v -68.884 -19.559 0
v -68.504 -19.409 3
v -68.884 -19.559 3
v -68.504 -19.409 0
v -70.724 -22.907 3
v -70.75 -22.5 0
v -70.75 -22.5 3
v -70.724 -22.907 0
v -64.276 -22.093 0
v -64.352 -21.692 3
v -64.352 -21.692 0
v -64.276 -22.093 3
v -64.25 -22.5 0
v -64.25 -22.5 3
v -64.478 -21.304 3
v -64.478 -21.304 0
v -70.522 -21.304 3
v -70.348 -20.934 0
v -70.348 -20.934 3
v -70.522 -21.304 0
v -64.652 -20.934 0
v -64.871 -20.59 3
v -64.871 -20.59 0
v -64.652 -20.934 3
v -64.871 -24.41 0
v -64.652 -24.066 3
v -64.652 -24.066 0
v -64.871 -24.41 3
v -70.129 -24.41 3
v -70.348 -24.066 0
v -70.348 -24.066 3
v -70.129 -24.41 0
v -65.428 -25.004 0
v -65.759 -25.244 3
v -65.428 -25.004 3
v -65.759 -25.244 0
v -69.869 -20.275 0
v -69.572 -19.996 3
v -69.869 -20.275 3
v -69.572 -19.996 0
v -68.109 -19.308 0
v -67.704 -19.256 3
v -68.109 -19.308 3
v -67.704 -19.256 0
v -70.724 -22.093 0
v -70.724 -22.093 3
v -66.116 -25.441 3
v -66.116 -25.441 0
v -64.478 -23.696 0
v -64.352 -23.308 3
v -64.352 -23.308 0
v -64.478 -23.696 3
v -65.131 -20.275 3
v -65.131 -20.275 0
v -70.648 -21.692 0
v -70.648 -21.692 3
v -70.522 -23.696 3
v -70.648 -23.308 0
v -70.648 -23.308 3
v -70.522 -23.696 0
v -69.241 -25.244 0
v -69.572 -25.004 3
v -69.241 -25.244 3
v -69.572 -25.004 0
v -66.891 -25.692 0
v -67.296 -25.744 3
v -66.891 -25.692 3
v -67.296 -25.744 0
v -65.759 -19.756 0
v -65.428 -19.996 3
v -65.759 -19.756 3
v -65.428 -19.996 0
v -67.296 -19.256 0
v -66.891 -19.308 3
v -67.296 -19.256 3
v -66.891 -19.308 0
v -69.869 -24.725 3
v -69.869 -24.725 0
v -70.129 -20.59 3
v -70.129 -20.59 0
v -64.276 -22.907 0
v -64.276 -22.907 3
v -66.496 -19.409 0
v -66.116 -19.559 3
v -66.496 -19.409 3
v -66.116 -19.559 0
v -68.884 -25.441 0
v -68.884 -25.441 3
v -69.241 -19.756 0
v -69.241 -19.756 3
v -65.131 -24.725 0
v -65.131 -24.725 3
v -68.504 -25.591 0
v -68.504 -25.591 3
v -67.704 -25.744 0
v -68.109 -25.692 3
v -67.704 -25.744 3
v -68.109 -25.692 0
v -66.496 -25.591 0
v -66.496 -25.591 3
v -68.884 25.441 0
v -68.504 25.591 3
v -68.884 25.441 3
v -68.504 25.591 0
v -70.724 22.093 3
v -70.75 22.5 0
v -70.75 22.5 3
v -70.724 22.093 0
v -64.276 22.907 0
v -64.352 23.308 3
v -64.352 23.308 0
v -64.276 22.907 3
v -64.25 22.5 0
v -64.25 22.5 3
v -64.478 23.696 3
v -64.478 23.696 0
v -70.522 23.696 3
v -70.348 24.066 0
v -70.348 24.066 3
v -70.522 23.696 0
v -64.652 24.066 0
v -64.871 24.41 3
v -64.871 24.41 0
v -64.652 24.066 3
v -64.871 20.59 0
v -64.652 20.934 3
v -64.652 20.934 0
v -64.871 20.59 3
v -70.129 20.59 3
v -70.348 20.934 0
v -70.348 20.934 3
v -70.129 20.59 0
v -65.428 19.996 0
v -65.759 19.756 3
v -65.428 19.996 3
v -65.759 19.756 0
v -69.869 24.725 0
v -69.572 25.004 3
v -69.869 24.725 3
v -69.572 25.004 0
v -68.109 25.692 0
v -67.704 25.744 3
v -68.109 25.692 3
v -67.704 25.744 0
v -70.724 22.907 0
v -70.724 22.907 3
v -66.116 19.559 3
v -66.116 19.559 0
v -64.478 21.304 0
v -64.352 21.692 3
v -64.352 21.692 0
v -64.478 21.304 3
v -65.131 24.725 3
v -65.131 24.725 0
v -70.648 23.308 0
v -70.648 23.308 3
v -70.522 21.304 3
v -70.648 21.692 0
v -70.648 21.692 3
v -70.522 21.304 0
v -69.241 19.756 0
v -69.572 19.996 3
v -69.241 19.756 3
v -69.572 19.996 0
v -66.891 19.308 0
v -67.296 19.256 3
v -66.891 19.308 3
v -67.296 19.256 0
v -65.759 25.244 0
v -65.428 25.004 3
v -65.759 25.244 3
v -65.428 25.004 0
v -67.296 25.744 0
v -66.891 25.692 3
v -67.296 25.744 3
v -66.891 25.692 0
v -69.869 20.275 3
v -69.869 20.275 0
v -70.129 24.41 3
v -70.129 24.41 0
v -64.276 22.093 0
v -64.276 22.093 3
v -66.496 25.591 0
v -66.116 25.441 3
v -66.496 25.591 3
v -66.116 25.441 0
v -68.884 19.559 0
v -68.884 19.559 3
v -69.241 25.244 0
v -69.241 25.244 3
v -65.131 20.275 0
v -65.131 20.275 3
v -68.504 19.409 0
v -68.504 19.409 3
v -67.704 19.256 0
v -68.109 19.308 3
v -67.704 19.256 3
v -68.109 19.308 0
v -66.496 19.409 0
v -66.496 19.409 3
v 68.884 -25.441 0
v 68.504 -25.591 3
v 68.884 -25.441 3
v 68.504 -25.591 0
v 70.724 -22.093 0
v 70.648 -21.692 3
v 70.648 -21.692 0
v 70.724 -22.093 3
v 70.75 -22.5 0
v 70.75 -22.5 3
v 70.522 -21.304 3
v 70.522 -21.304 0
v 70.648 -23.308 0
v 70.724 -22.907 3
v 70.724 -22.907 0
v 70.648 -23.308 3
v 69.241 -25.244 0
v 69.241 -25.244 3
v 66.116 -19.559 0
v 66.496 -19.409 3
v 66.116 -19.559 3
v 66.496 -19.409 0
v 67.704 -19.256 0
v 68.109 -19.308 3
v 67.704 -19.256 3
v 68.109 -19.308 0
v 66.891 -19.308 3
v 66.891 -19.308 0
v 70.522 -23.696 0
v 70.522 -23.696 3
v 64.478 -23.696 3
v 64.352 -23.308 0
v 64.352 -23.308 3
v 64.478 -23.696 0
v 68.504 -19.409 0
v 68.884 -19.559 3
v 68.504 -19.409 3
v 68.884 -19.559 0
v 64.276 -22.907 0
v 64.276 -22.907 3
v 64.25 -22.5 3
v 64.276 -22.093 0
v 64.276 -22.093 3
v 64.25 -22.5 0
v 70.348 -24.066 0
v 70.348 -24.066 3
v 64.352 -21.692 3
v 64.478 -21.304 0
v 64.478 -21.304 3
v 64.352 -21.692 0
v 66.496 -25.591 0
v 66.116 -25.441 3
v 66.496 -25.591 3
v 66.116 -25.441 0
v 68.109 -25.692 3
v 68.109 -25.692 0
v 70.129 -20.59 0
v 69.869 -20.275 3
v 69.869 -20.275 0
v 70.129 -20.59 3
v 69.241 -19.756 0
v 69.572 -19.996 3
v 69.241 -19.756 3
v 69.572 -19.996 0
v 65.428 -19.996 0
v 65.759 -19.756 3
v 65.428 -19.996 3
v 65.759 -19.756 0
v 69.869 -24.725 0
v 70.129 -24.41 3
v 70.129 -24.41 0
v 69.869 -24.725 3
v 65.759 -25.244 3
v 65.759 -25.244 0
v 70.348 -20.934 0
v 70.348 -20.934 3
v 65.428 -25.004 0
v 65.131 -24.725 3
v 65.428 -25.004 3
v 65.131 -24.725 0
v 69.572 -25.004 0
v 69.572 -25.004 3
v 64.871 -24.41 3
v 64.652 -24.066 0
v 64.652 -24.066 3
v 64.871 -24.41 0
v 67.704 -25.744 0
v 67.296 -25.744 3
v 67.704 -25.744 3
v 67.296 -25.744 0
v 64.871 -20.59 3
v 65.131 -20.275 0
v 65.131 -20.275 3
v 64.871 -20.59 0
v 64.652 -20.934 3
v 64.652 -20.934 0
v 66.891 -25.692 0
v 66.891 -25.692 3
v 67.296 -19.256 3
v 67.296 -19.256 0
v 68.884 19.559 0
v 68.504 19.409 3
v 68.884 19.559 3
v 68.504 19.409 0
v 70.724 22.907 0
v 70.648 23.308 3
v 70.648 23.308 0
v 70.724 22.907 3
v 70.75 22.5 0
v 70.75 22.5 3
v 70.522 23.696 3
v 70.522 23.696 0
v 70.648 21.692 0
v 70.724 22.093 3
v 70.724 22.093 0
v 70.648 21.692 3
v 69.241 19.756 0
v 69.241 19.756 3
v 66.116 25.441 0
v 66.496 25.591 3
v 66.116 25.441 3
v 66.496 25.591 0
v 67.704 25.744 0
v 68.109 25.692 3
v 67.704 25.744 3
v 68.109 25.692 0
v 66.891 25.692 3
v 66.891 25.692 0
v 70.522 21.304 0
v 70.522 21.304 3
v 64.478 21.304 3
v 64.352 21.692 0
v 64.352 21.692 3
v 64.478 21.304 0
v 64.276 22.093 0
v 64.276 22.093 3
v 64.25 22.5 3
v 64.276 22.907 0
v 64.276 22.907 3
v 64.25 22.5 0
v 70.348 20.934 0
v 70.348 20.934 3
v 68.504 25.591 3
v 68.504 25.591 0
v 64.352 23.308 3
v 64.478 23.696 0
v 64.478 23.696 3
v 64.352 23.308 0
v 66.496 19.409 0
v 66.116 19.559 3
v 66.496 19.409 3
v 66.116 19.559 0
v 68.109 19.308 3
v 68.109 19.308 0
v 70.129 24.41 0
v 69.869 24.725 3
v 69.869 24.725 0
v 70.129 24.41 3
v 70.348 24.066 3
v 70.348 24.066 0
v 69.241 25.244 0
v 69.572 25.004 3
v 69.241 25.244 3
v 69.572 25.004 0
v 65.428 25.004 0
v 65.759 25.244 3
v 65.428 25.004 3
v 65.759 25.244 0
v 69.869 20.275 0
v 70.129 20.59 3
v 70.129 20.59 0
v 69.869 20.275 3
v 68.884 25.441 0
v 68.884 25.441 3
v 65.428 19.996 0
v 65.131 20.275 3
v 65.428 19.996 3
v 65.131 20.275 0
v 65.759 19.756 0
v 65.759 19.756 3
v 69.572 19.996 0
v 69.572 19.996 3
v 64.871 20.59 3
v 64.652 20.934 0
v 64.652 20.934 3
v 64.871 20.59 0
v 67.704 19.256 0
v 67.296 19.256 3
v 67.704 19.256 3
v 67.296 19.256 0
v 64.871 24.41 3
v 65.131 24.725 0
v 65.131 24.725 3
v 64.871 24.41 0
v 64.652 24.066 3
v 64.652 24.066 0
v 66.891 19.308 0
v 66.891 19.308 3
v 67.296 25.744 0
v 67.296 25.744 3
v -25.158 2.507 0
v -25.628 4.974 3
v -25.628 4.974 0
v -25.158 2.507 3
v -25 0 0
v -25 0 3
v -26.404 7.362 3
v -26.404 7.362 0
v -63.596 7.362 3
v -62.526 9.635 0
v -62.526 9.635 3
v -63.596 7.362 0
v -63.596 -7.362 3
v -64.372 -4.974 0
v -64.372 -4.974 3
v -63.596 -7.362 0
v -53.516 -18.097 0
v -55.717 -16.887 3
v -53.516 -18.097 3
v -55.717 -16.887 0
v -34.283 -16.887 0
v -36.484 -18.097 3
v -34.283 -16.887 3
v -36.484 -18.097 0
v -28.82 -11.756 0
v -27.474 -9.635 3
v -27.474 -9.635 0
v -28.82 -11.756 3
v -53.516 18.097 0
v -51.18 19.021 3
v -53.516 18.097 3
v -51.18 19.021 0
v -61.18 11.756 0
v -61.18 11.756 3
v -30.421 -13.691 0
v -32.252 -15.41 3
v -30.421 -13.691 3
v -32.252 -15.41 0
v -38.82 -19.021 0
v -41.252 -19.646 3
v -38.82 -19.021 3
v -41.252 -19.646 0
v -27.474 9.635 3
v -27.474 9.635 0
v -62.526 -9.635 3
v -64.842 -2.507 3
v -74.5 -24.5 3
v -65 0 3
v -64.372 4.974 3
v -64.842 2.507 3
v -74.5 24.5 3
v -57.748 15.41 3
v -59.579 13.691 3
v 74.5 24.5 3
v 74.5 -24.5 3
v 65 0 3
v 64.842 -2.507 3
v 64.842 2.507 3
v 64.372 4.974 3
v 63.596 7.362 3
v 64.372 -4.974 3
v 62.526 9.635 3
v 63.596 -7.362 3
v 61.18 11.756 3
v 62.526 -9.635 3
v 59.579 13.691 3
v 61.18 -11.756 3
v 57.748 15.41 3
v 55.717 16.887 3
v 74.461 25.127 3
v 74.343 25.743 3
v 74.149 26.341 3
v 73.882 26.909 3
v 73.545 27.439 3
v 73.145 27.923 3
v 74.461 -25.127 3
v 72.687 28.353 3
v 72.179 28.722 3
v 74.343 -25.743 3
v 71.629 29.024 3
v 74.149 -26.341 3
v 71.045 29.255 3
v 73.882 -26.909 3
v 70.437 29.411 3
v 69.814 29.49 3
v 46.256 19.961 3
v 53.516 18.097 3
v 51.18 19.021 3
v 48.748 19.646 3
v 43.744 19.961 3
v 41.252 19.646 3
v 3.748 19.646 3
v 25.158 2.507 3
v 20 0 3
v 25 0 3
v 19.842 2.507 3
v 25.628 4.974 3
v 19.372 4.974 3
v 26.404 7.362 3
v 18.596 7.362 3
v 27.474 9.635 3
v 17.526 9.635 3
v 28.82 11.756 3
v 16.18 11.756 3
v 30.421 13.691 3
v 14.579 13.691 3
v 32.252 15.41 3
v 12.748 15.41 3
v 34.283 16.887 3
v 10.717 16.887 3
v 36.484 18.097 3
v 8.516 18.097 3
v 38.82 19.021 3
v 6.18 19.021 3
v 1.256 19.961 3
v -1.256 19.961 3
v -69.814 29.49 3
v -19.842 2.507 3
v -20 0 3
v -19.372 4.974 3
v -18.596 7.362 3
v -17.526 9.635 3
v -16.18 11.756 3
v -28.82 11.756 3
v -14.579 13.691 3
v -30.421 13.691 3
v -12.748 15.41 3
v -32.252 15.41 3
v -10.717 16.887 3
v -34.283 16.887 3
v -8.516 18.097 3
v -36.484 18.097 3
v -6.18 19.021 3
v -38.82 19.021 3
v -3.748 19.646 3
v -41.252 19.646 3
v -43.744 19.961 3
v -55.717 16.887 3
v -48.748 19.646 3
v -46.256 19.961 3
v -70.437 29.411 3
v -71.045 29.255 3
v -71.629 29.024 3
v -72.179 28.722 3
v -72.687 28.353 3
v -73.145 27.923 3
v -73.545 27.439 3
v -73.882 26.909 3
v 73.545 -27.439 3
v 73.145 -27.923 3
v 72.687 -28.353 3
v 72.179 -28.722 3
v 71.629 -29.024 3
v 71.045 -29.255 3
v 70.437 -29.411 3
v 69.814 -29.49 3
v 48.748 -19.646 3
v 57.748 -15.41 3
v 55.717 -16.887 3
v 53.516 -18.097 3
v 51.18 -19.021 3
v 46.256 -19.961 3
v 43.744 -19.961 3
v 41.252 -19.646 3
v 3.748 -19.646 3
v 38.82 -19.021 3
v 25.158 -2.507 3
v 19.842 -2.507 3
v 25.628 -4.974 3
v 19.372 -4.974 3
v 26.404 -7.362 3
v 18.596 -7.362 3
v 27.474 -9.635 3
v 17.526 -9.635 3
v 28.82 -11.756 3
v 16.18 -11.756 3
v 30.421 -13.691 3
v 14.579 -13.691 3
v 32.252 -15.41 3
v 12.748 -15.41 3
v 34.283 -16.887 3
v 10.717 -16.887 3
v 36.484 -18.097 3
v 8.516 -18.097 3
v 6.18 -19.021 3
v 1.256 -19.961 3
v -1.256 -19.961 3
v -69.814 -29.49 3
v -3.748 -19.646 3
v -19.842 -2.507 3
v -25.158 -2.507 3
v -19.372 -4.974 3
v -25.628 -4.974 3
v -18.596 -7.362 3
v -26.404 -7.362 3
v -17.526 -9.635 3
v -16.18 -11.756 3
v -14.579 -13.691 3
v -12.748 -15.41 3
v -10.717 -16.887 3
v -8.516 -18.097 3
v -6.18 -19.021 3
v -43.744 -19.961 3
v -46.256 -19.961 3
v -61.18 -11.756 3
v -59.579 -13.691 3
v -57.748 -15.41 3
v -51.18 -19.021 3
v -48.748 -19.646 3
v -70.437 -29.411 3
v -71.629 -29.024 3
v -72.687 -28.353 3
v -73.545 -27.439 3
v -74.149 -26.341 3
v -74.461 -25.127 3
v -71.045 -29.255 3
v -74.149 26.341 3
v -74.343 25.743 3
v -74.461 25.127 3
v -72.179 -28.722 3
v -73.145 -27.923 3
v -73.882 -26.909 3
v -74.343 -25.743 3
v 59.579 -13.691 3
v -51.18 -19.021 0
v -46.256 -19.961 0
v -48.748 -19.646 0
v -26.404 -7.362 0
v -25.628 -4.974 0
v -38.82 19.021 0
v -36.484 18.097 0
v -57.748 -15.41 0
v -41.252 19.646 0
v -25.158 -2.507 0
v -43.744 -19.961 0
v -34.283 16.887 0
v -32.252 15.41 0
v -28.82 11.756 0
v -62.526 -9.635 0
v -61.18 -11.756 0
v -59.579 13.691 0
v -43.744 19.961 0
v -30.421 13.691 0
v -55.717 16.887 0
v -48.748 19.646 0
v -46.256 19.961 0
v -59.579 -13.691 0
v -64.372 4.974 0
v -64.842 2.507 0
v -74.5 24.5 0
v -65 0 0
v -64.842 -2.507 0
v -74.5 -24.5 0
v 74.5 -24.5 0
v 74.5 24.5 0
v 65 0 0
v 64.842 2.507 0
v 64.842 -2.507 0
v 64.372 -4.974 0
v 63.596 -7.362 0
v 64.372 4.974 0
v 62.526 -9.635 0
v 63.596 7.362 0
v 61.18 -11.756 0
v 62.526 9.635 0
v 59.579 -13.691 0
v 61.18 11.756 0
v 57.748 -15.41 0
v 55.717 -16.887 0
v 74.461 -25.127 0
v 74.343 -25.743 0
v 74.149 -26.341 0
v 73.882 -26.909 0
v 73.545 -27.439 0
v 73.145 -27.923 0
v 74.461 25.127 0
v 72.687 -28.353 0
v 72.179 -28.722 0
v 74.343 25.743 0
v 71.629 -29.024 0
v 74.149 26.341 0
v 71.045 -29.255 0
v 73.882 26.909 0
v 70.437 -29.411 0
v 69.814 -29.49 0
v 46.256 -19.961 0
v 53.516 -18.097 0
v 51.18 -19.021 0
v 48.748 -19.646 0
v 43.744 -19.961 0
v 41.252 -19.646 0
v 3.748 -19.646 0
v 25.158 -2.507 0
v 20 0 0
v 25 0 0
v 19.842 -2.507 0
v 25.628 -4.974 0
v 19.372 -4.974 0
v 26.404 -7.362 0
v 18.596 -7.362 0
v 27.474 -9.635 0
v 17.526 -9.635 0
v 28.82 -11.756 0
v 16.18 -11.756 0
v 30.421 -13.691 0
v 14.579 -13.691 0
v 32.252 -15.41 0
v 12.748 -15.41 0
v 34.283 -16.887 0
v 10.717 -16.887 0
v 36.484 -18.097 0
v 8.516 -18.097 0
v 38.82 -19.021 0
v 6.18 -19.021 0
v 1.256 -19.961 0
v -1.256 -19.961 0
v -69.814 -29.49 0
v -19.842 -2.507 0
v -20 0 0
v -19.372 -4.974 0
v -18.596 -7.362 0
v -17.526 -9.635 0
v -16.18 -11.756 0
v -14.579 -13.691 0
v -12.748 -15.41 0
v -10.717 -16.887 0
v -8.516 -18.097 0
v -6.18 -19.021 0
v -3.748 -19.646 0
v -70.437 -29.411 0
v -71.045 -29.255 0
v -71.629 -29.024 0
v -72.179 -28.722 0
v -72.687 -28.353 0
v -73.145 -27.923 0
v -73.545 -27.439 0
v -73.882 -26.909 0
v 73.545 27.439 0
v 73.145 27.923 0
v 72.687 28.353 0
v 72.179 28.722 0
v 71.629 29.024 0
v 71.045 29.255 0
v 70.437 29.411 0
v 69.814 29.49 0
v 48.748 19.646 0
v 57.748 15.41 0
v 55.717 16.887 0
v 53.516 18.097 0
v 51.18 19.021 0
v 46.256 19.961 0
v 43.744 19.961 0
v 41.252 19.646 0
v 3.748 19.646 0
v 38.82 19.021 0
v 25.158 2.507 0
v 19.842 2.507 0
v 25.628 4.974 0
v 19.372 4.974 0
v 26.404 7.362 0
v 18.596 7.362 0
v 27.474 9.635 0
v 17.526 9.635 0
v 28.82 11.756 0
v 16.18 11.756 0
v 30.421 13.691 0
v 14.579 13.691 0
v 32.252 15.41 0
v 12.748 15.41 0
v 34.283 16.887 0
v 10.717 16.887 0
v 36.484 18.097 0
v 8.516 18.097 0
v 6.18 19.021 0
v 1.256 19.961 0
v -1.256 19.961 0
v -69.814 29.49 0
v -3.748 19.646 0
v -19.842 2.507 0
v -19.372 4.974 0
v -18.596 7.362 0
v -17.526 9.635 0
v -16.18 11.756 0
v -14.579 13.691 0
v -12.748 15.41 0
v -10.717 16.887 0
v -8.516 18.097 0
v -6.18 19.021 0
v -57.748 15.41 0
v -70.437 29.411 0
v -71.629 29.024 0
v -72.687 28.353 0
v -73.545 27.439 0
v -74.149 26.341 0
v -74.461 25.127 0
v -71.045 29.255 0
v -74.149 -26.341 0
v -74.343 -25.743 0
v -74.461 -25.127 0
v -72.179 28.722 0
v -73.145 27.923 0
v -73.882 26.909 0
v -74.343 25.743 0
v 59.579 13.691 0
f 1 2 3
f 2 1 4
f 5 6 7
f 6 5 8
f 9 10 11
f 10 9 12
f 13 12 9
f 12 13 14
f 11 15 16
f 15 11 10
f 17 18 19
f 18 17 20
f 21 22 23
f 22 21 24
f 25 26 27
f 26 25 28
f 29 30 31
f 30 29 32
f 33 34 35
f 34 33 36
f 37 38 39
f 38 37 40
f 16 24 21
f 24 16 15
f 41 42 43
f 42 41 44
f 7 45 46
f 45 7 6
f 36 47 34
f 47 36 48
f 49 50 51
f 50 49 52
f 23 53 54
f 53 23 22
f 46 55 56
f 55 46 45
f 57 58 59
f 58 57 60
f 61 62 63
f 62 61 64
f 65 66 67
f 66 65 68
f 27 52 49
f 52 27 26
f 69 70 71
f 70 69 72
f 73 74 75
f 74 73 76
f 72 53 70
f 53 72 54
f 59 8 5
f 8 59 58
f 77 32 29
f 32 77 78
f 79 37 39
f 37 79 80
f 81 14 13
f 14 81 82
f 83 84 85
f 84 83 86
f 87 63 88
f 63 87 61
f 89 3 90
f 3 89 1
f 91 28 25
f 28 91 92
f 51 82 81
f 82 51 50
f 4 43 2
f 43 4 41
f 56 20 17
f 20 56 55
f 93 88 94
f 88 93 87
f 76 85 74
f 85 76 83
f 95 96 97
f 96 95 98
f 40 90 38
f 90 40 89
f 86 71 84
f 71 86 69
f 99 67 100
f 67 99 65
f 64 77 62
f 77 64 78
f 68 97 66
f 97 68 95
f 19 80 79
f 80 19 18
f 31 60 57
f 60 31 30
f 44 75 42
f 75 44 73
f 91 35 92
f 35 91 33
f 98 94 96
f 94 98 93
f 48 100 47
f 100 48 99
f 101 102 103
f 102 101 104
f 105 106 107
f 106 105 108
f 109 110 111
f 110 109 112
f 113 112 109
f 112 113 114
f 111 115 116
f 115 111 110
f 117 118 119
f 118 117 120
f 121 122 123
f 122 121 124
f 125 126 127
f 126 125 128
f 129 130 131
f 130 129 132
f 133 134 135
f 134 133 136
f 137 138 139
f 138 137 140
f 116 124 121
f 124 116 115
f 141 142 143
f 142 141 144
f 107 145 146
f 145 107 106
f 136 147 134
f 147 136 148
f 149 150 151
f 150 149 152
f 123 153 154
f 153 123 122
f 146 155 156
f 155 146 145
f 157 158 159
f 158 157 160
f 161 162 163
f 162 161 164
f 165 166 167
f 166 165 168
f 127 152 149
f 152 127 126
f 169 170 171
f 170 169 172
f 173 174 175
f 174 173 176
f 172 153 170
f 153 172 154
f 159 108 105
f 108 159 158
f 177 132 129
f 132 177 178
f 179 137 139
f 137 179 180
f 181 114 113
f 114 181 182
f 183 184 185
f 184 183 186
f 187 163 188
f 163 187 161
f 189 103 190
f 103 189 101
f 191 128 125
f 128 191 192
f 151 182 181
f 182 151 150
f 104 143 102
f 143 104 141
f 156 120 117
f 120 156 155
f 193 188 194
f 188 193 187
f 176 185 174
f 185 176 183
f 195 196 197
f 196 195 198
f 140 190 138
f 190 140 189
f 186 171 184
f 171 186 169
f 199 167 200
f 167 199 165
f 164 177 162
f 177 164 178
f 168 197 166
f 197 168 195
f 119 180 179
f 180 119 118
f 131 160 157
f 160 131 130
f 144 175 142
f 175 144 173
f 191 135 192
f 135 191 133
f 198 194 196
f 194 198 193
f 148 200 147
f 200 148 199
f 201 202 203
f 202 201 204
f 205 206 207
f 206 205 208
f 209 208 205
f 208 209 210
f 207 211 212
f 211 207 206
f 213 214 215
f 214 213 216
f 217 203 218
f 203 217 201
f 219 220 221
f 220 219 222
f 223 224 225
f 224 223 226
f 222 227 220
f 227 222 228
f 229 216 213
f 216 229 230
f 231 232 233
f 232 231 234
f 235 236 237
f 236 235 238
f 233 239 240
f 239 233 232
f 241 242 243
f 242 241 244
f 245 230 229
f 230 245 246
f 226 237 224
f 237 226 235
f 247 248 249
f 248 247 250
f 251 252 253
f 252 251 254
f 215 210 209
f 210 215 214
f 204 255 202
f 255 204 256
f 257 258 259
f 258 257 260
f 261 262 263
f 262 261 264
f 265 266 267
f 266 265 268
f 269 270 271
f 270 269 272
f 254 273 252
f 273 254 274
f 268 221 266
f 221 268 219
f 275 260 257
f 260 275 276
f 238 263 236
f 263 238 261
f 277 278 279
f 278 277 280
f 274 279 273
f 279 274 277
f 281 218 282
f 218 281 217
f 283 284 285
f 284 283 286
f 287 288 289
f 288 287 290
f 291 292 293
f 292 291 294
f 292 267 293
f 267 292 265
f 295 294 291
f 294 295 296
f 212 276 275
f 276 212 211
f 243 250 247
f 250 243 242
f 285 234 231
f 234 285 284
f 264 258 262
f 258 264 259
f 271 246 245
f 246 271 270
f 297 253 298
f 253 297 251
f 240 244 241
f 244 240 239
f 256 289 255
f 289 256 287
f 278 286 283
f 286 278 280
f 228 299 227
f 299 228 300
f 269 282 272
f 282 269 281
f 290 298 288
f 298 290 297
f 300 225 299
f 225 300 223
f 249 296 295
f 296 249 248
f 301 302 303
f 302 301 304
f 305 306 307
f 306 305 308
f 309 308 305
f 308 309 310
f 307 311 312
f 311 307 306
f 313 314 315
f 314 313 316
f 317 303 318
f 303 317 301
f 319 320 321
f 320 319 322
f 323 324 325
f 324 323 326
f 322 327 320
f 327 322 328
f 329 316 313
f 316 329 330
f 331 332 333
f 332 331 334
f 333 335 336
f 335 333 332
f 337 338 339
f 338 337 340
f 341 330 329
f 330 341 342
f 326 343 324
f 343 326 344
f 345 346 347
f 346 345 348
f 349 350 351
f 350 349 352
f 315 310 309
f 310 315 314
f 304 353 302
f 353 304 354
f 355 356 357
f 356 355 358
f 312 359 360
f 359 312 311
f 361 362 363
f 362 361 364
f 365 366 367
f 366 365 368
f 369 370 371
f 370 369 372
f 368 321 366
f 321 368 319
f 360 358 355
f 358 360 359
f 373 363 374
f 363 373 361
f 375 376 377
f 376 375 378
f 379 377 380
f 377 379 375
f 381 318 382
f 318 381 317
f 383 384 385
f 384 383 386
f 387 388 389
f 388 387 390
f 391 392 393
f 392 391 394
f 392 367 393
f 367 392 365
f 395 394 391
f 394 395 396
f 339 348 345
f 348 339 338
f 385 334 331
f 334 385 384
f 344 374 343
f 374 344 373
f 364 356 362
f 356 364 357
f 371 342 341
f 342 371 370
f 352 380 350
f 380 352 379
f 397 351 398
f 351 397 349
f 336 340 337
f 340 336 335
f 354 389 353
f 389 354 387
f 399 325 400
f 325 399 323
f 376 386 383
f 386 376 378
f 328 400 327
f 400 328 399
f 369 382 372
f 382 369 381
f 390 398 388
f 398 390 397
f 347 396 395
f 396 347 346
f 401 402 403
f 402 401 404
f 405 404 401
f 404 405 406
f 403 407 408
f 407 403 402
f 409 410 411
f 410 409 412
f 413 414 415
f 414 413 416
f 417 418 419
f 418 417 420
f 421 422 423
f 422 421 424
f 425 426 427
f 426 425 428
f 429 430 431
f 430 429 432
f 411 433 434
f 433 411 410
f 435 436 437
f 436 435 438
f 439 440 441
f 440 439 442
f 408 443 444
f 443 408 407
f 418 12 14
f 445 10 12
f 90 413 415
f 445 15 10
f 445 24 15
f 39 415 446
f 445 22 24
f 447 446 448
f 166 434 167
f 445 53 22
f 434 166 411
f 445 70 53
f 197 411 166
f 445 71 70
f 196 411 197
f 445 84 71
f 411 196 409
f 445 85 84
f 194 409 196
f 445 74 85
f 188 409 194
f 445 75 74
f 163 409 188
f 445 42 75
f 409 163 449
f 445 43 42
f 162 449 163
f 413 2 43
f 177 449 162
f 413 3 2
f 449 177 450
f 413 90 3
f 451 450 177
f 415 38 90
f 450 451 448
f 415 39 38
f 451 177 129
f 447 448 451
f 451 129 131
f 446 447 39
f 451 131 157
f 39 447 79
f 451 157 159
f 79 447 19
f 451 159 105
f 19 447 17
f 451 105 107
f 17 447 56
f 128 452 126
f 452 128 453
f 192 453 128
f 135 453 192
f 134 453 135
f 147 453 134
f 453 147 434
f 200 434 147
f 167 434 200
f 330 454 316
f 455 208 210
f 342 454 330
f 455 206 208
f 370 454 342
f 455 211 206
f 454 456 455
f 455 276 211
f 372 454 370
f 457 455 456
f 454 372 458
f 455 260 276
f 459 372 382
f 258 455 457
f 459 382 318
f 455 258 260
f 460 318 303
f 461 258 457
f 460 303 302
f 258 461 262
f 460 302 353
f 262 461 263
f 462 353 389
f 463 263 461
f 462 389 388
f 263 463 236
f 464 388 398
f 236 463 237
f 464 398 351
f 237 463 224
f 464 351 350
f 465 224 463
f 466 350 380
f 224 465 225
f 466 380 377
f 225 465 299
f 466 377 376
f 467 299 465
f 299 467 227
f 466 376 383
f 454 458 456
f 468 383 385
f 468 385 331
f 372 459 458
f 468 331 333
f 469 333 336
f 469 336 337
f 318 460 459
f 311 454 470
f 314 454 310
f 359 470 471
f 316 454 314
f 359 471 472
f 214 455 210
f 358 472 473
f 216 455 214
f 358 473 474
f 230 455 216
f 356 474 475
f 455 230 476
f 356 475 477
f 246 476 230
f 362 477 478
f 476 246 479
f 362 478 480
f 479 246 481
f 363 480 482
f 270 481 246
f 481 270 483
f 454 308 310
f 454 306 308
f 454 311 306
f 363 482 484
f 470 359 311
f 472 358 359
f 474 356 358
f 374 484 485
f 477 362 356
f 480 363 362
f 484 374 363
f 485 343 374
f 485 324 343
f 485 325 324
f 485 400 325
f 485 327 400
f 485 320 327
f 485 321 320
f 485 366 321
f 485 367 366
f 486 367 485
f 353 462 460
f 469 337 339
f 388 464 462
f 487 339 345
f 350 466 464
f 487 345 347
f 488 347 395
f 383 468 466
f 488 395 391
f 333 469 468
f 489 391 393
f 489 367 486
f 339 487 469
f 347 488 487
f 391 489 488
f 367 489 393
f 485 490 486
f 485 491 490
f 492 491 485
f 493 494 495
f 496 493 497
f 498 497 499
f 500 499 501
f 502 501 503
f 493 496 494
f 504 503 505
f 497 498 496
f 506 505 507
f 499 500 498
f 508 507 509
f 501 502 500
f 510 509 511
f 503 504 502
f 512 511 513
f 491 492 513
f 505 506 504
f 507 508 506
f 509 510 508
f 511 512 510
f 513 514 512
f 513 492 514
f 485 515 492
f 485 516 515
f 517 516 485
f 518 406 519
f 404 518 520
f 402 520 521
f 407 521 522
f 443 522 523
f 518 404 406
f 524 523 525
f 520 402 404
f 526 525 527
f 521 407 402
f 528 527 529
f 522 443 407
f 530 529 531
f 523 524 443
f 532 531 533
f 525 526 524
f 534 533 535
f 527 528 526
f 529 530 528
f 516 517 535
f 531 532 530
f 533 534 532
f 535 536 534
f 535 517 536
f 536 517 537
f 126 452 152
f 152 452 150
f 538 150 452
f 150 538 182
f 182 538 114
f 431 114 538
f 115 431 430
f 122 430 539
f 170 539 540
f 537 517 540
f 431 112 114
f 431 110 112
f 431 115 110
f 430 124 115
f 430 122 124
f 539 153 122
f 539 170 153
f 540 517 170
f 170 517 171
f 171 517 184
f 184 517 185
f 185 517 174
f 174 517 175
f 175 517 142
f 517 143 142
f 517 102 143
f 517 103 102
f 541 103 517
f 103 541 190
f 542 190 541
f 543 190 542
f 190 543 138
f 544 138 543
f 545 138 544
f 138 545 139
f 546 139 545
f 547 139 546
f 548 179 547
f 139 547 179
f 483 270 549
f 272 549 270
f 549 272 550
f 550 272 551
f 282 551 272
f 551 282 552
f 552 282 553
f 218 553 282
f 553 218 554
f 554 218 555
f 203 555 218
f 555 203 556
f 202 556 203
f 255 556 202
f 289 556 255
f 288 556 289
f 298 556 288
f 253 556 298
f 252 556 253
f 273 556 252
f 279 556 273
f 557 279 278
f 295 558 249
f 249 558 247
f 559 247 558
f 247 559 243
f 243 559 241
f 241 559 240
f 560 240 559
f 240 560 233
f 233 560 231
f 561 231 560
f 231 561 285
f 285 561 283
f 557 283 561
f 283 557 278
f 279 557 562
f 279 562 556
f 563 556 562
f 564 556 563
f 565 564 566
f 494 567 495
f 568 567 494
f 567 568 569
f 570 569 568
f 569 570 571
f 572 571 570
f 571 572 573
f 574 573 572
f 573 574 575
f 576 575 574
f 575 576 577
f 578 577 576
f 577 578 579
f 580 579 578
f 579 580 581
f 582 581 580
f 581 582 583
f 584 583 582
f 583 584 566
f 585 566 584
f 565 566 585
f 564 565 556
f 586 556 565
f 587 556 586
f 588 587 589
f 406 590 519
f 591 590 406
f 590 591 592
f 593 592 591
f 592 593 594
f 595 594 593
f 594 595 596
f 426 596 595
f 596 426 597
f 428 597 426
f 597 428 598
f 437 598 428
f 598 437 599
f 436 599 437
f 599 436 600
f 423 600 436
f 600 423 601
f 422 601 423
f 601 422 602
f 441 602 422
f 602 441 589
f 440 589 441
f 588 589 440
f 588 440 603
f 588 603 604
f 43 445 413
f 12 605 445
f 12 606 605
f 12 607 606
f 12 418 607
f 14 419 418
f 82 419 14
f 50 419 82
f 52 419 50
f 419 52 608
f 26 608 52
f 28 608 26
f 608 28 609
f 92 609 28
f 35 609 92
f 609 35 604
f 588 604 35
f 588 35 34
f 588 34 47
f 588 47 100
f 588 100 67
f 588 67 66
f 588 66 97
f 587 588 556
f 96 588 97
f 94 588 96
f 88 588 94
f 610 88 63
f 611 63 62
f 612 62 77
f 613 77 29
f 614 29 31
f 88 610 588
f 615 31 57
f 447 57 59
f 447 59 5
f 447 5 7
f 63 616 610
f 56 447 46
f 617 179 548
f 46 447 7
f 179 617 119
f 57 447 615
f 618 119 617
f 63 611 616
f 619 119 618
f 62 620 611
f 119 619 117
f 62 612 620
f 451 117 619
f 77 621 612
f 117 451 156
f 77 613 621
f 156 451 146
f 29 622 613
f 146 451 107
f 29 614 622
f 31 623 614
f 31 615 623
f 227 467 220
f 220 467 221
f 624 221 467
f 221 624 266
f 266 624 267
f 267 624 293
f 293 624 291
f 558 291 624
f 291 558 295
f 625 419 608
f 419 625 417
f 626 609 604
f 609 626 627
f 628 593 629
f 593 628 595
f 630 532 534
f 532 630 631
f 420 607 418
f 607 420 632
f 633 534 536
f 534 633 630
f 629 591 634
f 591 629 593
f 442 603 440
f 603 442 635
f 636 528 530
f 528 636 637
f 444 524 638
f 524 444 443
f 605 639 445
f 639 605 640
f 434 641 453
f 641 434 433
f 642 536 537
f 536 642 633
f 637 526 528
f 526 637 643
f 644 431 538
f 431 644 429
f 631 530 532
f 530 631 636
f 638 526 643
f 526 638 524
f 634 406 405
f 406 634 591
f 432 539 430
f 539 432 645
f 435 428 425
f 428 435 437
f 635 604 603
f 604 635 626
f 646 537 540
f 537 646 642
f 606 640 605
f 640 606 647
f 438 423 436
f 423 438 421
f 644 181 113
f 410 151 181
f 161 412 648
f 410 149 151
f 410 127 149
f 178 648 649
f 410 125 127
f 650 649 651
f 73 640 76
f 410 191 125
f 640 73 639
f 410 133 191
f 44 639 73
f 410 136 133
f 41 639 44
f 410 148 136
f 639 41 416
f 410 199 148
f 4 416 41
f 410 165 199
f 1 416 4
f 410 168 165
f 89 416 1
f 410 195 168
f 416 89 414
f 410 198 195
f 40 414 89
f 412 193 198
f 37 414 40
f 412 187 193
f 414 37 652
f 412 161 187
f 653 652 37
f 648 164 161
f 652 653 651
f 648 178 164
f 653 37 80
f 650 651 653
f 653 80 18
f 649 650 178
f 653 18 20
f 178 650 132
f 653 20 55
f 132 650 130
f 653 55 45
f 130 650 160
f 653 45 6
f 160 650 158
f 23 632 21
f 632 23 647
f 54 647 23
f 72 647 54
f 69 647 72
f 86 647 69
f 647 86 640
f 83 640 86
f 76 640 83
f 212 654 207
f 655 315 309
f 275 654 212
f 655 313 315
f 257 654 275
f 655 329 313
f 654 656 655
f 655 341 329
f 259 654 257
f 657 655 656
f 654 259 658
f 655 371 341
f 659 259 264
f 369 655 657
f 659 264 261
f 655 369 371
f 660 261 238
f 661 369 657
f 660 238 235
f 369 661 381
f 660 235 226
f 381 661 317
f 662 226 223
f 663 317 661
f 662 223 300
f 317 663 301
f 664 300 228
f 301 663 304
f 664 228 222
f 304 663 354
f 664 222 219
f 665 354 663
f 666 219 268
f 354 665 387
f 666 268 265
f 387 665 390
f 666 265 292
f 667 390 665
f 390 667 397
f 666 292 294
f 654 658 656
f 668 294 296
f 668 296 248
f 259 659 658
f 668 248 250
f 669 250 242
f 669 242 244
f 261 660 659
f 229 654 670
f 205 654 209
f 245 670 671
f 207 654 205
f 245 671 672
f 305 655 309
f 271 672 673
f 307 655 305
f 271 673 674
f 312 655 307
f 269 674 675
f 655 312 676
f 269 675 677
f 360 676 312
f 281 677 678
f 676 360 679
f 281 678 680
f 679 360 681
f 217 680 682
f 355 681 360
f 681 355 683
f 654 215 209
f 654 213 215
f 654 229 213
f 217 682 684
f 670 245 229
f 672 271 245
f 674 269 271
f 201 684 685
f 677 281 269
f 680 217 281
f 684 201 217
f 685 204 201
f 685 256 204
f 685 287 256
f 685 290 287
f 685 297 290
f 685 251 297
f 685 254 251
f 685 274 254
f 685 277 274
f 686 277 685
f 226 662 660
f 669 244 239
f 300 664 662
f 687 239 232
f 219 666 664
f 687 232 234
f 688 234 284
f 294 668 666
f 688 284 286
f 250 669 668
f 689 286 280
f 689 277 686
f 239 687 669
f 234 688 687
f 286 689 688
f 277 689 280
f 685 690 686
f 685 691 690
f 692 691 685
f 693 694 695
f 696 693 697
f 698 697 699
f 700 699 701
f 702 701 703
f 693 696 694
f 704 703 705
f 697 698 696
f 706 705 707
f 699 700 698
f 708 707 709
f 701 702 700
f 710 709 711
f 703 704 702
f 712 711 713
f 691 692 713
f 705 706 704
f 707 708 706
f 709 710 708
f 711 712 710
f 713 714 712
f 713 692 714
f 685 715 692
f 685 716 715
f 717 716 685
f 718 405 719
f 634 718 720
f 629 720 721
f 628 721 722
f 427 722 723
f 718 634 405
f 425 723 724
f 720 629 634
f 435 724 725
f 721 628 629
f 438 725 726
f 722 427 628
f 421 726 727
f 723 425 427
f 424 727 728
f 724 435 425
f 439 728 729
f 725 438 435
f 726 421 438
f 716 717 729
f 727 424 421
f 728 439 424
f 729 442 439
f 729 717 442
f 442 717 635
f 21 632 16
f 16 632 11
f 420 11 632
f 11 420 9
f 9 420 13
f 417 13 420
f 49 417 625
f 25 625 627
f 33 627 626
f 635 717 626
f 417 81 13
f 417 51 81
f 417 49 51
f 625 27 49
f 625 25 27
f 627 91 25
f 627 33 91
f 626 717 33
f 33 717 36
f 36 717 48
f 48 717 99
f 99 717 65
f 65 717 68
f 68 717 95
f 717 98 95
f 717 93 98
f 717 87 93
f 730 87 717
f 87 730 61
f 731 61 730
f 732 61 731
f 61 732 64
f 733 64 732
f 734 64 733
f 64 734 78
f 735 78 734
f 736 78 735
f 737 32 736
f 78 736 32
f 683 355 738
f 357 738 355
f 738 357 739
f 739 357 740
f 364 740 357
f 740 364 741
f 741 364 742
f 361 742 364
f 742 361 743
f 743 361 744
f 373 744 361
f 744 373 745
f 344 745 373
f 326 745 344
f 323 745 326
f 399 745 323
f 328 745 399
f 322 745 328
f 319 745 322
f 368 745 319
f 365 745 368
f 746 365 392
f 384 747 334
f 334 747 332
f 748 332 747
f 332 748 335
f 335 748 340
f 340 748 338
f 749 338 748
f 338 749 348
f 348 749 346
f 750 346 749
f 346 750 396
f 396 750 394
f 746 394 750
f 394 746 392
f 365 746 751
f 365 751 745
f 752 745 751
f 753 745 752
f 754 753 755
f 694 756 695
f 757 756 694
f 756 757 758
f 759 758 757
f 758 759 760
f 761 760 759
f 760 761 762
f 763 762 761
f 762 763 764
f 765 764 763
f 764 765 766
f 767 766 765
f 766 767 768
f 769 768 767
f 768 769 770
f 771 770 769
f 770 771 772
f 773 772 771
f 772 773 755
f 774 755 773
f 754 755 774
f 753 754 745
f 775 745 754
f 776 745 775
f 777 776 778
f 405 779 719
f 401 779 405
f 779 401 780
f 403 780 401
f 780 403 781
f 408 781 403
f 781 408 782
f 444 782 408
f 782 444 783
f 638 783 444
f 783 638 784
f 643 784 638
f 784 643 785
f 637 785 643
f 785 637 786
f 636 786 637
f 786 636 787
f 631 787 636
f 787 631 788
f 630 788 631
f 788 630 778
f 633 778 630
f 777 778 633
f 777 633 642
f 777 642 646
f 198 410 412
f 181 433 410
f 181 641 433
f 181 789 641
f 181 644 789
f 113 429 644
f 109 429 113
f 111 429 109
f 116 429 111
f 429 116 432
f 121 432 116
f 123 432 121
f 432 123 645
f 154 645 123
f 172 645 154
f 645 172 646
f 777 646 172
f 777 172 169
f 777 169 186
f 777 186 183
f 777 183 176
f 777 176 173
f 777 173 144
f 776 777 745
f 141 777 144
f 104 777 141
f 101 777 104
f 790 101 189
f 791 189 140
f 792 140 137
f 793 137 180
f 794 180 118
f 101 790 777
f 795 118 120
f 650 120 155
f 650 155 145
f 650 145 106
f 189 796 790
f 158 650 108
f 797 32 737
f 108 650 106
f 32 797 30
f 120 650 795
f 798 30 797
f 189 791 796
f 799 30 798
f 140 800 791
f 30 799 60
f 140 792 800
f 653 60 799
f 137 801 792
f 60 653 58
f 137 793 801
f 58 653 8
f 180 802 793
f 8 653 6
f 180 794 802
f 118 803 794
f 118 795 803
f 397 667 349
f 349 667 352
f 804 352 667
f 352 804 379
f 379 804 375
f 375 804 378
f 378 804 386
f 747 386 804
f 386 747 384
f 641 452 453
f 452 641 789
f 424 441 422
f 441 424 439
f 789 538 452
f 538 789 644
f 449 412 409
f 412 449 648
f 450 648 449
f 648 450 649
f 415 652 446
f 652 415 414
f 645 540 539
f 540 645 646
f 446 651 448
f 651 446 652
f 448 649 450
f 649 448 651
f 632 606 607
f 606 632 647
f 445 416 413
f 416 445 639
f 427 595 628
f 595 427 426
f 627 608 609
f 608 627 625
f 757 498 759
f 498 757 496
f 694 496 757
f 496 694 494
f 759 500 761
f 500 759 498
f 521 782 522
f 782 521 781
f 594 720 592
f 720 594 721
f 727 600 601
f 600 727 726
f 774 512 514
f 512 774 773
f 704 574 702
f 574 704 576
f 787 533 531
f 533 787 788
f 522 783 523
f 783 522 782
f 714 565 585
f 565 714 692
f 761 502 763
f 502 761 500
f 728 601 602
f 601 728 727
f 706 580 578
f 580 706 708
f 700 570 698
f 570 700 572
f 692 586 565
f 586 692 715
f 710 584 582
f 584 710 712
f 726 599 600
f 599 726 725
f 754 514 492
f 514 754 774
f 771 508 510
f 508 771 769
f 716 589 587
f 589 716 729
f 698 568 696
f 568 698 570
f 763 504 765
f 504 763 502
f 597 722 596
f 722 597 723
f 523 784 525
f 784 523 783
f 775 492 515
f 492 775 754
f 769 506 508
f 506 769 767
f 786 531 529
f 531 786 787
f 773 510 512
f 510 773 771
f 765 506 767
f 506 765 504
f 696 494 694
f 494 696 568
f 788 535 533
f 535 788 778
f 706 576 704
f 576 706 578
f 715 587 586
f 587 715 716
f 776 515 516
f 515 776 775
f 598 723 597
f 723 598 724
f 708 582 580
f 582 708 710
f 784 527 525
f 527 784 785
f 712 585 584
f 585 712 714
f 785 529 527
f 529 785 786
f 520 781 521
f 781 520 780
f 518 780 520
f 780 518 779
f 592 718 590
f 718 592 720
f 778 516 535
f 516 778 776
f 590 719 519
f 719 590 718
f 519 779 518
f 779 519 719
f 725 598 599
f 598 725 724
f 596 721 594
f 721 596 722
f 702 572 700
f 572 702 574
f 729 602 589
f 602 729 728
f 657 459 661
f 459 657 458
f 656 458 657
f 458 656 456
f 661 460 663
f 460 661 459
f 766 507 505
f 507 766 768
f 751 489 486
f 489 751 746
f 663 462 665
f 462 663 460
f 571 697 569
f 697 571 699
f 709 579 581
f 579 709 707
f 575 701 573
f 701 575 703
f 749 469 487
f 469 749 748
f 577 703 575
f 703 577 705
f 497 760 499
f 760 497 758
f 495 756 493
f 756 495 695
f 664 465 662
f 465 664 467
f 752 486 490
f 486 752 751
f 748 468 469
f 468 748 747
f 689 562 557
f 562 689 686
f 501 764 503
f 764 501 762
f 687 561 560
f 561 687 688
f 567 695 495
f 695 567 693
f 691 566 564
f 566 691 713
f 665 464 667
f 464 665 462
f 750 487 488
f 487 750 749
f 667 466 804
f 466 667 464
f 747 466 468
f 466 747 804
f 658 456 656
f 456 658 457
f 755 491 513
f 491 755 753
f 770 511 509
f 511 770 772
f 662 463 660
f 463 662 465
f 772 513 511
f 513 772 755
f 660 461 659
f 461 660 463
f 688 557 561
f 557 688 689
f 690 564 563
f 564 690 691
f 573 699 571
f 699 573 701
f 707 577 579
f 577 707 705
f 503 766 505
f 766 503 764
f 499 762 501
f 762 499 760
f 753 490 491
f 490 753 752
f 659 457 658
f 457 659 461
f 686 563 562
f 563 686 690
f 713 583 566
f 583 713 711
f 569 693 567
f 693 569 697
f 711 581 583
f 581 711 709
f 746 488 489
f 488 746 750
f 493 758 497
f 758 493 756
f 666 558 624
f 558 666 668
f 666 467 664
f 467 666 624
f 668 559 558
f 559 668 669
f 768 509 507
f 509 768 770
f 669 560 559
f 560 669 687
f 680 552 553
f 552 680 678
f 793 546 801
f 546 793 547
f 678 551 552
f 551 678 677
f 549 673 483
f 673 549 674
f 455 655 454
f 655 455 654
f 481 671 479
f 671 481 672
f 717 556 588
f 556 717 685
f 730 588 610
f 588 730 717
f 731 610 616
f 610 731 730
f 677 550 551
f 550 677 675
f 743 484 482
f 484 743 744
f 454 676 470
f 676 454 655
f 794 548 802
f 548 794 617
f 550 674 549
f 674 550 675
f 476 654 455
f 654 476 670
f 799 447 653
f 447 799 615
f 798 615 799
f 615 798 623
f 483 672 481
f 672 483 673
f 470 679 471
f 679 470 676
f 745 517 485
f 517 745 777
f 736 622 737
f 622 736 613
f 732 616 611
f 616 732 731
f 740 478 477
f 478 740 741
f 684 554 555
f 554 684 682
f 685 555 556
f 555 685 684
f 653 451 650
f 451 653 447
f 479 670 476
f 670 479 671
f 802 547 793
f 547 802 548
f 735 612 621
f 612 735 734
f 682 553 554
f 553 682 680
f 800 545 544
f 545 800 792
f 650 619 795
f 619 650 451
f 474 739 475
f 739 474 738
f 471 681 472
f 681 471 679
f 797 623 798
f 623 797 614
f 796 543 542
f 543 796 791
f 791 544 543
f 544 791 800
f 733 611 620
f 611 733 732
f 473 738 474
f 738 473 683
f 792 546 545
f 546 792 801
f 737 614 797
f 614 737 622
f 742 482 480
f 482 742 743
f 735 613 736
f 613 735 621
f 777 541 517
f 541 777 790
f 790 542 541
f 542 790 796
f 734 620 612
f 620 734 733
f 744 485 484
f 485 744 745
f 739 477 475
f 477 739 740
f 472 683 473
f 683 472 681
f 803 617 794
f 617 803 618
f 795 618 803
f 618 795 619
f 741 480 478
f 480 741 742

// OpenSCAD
$fn = 50;

difference() {
	union() {
		hull() {
			translate(v = [-69.5, 24.5, 0]) {
				cylinder(h = 3, r = 5);
			}
			translate(v = [69.5, 24.5, 0]) {
				cylinder(h = 3, r = 5);
			}
			translate(v = [-69.5, -24.5, 0]) {
				cylinder(h = 3, r = 5);
			}
			translate(v = [69.5, -24.5, 0]) {
				cylinder(h = 3, r = 5);
			}
		}
	}
	union() {
		translate(v = [-67.5, -22.5, -100.0]) {
			cylinder(h = 200, r = 3.25);
		}
		translate(v = [-67.5, 22.5, -100.0]) {
			cylinder(h = 200, r = 3.25);
		}
		translate(v = [67.5, -22.5, -100.0]) {
			cylinder(h = 200, r = 3.25);
		}
		translate(v = [67.5, 22.5, -100.0]) {
			cylinder(h = 200, r = 3.25);
		}
		translate(v = [-67.5, -22.5, -100.0]) {
			cylinder(h = 200, r = 1.8);
		}
		translate(v = [-67.5, 22.5, -100.0]) {
			cylinder(h = 200, r = 1.8);
		}
		translate(v = [67.5, -22.5, -100.0]) {
			cylinder(h = 200, r = 1.8);
		}
		translate(v = [67.5, 22.5, -100.0]) {
			cylinder(h = 200, r = 1.8);
		}
		translate(v = [-45.0, 0, 0.0]) {
			cylinder(h = 3, r = 20.0);
		}
		cylinder(h = 3, r = 20.0);
		translate(v = [45.0, 0, 0.0]) {
			cylinder(h = 3, r = 20.0);
		}
	}
}
